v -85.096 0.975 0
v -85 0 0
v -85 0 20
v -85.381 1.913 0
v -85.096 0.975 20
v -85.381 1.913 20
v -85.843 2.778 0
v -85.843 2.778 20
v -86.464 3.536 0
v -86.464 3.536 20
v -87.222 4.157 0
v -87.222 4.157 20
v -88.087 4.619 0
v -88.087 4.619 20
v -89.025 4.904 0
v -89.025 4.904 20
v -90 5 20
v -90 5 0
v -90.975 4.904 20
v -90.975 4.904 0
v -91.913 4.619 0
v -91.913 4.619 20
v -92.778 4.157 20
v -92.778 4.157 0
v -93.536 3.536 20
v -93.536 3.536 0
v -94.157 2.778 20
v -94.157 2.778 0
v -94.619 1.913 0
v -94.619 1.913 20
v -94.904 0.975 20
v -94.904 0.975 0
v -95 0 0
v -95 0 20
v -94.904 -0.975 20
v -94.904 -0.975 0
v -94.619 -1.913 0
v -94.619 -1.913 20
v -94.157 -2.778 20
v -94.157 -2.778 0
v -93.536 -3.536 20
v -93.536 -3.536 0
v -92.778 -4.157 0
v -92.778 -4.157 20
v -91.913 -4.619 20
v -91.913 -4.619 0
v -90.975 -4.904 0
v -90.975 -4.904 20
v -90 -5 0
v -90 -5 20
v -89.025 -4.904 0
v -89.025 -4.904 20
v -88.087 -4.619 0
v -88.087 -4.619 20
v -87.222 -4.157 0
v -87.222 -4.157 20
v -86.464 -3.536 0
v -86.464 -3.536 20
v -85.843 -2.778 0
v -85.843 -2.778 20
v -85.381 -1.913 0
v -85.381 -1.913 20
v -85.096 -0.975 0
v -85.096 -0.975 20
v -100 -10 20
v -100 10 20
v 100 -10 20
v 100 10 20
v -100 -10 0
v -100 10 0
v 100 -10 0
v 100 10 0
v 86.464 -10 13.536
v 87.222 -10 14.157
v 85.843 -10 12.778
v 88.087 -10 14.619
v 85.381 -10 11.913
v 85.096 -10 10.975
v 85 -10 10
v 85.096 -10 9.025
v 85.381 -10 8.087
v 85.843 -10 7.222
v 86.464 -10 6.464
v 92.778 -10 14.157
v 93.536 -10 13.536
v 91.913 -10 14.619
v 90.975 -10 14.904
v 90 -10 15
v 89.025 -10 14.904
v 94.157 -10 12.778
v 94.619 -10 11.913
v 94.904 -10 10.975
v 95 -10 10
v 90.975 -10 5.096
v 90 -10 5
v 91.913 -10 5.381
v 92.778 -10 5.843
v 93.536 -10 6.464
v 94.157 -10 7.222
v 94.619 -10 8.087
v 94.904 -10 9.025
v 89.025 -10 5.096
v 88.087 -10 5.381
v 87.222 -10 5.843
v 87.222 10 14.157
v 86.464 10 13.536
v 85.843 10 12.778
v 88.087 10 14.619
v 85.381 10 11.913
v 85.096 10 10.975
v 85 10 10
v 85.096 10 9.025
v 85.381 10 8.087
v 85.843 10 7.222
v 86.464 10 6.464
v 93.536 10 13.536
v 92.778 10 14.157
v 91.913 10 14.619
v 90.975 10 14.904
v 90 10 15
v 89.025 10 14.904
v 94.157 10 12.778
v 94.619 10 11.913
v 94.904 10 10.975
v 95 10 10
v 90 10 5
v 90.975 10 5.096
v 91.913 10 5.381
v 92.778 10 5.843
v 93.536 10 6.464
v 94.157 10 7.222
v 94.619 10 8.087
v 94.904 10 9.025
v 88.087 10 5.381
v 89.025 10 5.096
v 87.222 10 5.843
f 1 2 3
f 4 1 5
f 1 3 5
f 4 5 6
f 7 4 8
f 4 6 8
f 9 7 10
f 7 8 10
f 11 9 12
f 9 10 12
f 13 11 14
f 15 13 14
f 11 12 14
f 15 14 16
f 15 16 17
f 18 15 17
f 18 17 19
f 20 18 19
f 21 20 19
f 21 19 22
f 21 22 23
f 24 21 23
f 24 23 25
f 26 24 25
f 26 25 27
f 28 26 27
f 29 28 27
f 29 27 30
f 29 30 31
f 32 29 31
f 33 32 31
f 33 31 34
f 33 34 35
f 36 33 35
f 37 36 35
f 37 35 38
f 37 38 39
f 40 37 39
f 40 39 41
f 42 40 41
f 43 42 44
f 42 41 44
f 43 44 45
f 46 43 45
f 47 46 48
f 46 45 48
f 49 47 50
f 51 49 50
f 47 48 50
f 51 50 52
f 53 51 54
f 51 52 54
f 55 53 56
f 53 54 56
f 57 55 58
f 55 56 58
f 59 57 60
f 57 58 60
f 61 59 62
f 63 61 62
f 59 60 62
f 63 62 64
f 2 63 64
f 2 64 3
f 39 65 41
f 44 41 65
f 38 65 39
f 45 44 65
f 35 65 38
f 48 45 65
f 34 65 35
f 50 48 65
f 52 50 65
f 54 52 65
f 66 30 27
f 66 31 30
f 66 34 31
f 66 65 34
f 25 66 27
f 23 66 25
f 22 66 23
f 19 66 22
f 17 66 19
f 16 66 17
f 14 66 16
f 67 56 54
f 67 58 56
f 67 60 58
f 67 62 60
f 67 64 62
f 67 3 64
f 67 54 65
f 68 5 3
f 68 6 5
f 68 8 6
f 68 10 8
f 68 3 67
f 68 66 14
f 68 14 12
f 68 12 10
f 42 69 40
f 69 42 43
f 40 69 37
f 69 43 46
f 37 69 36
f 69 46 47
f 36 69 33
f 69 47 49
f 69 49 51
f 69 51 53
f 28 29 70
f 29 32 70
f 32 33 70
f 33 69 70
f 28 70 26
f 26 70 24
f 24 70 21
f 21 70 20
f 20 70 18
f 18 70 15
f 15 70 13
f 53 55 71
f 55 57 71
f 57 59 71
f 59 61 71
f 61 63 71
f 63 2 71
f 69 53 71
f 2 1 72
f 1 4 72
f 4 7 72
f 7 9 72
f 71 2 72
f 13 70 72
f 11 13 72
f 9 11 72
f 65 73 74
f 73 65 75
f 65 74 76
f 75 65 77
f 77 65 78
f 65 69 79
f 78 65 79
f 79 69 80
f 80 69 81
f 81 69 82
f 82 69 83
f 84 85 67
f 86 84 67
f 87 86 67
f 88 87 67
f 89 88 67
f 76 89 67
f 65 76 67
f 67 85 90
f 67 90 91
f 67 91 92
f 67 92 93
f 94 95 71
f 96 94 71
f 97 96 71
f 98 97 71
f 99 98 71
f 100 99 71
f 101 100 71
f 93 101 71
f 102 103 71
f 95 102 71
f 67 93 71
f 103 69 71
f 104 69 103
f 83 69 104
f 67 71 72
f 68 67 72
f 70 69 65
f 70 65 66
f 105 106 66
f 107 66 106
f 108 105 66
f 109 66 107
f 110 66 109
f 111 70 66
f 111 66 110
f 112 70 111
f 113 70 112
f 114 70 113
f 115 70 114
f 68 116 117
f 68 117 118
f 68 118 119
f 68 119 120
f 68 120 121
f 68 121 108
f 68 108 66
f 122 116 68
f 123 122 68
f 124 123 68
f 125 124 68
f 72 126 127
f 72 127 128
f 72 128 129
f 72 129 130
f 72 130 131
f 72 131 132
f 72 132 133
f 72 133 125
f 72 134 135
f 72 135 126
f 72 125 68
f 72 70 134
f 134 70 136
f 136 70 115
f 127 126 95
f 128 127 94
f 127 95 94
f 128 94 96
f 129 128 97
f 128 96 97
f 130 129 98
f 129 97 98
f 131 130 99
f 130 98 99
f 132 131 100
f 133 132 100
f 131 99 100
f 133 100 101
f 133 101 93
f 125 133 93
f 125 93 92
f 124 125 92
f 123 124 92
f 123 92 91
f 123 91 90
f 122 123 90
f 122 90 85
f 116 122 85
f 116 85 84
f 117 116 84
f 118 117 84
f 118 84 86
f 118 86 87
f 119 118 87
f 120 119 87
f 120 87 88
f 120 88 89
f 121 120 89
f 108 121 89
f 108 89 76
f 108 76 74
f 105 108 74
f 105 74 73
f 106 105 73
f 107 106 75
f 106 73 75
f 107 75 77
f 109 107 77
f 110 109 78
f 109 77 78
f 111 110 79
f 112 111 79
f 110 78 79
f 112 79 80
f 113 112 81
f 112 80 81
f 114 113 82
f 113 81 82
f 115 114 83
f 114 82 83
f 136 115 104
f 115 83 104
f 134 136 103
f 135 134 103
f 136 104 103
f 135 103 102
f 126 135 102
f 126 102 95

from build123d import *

# Parameters (mm, degrees)
SKETCH1_W           = 200
SKETCH1_H           = 20
BOSS_EXTRUDE2_DEPTH = 20
SKETCH3_R           = 5
CUT_EXTRUDE1_DEPTH  = 103.46950766
SKETCH4_R           = 5
CUT_EXTRUDE2_DEPTH  = 104.923048454


with BuildPart() as part:
    # Sketch1 → Boss-Extrude2 (new body)
    with BuildSketch(Plane.XY):
        Rectangle(SKETCH1_W, SKETCH1_H)
    extrude(amount=BOSS_EXTRUDE2_DEPTH)

    # Sketch3 → Cut-Extrude1 (cut, through all)
    with BuildSketch(Plane.XY.offset(20)):
        with Locations((-90, 0)):
            Circle(SKETCH3_R)
    extrude(amount=-CUT_EXTRUDE1_DEPTH, mode=Mode.SUBTRACT)

    # Sketch4 → Cut-Extrude2 (cut, through all)
    with BuildSketch(Plane.XZ.offset(10)):
        with Locations(Location((90, 10, 0), (0, 0, 270))):
            Circle(SKETCH4_R)
    extrude(amount=-CUT_EXTRUDE2_DEPTH, mode=Mode.SUBTRACT)


solid = part.part
